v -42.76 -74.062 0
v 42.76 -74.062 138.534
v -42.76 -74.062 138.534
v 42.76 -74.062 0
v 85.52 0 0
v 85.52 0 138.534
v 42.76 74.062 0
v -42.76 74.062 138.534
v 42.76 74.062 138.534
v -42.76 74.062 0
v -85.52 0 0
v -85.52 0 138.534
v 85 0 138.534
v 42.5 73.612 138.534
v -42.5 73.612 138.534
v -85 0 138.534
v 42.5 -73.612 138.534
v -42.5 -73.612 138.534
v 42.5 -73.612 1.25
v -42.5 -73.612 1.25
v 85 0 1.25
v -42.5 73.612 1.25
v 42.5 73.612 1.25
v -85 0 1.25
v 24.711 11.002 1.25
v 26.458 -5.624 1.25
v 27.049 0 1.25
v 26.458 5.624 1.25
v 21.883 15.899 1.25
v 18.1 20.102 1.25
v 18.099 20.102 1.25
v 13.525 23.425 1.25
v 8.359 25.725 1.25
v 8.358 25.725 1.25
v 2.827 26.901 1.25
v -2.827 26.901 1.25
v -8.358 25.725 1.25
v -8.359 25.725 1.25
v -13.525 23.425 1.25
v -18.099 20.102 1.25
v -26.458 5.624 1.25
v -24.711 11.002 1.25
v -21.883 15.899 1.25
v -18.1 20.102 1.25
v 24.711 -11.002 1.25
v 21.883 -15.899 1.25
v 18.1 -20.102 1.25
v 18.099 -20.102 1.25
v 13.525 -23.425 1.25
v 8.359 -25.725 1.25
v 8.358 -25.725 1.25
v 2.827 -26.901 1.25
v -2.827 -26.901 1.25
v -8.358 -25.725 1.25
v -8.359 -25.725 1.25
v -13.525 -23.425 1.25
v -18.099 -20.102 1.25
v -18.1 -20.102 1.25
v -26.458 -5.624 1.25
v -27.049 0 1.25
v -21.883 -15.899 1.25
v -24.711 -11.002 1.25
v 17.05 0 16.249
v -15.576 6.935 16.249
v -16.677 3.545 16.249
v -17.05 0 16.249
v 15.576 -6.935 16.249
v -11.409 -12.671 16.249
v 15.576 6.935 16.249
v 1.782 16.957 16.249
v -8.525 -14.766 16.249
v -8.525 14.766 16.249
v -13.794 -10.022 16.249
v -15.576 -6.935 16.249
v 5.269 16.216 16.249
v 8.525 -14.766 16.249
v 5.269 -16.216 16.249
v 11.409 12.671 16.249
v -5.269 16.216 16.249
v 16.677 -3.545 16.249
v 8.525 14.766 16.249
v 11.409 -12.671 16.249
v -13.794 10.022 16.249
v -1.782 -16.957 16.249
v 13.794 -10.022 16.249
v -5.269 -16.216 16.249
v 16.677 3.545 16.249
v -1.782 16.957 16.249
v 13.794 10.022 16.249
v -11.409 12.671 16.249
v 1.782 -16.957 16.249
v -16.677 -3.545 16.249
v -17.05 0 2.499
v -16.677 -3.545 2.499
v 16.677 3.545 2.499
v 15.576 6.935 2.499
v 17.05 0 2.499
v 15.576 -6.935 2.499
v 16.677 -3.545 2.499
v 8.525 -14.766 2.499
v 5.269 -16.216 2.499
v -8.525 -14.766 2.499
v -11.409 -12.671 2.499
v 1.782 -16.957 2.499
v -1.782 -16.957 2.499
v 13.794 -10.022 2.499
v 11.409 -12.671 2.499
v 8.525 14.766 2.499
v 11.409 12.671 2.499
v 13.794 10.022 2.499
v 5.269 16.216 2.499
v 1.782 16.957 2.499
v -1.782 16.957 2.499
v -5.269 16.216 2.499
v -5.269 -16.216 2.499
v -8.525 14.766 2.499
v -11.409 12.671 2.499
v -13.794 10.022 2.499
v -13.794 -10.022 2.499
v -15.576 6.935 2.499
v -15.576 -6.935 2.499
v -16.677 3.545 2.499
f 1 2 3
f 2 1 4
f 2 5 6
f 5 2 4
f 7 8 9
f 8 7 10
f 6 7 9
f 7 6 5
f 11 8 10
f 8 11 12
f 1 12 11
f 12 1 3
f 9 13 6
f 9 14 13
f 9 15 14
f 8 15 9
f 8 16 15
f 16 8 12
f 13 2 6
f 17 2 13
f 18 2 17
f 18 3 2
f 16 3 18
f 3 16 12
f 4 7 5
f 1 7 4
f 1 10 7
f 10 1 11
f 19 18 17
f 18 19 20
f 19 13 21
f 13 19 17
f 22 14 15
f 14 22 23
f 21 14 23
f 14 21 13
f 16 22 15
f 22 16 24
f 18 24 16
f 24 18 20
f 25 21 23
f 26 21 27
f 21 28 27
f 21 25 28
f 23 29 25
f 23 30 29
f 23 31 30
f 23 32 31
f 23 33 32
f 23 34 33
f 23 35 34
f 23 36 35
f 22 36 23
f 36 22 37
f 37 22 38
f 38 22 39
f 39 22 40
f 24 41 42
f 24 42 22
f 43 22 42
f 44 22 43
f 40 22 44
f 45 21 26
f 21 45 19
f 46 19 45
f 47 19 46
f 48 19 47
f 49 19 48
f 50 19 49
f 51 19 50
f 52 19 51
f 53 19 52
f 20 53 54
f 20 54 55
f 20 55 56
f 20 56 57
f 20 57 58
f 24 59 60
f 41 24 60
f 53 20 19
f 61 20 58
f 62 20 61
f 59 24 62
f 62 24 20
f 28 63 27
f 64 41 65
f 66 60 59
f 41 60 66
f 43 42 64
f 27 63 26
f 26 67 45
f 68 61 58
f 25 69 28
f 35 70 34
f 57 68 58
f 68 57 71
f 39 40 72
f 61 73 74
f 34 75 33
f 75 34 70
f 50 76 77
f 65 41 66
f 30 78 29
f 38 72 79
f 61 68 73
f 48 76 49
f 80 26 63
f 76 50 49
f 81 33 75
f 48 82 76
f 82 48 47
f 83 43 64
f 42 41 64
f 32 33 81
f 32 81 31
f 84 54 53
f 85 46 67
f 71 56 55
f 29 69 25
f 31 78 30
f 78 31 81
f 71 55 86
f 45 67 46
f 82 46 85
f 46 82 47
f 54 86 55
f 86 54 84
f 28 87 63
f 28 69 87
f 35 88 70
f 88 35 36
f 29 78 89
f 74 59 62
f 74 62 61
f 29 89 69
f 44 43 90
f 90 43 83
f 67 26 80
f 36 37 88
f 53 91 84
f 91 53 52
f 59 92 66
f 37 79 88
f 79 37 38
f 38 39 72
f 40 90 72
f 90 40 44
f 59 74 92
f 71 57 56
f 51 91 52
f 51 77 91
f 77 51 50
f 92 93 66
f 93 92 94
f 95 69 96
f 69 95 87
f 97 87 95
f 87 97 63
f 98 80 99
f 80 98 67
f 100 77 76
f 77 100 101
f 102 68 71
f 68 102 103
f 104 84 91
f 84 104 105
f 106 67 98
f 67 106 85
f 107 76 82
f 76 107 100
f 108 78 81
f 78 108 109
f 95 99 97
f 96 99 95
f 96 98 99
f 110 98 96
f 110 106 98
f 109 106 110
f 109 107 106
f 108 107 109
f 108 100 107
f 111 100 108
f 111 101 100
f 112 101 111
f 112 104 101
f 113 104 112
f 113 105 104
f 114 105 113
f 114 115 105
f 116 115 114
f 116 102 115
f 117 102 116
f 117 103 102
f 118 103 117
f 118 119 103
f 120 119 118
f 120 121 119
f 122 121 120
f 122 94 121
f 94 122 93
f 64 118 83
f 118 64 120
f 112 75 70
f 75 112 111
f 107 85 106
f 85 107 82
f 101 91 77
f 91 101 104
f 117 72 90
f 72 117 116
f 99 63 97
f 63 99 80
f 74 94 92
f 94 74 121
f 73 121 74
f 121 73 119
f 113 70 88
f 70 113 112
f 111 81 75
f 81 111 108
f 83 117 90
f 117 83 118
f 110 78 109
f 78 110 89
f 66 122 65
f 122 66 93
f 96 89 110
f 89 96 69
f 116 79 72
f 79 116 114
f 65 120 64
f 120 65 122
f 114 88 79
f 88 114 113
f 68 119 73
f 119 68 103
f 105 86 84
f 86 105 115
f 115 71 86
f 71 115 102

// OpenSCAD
// pounds
totalWeight = 25; 
// pounds
rodWeight = 0.5; 
// kg/m^3
density = 2300; 
diameter = 170;
bottomWall = 1.25;
sideWall = 1.2;
// include some tolerance
rodGuideDiameter = 34.1; 
rodGuideHeight = 15;
rodGuideThickness = 10;
handleLength = 133;
extraHeight = 2;

module dummy() {}

endWeight = (totalWeight-rodWeight)*0.453592/2;
echo("endWeight",endWeight);
V = endWeight/density * pow(1000,3);
A = 3*sqrt(3)*pow(diameter/2,2)/2-pow(rodGuideDiameter/2,2)*PI;
h = V/A+extraHeight;
echo("height",h);
echo("rod length",h*2+handleLength);

difference() {
    cylinder(d=diameter+sideWall*sqrt(3)/2,h=h+bottomWall,$fn=6);
    translate([0,0,bottomWall])     cylinder(d=diameter,h=h+bottomWall,$fn=6);
}
translate([0,0,bottomWall-.001])
difference(){
    cylinder(d1=(rodGuideDiameter+rodGuideThickness*2),d2=rodGuideDiameter,h=rodGuideHeight);
    translate([0,0,bottomWall]) cylinder(d=rodGuideDiameter,h=rodGuideHeight);
}
